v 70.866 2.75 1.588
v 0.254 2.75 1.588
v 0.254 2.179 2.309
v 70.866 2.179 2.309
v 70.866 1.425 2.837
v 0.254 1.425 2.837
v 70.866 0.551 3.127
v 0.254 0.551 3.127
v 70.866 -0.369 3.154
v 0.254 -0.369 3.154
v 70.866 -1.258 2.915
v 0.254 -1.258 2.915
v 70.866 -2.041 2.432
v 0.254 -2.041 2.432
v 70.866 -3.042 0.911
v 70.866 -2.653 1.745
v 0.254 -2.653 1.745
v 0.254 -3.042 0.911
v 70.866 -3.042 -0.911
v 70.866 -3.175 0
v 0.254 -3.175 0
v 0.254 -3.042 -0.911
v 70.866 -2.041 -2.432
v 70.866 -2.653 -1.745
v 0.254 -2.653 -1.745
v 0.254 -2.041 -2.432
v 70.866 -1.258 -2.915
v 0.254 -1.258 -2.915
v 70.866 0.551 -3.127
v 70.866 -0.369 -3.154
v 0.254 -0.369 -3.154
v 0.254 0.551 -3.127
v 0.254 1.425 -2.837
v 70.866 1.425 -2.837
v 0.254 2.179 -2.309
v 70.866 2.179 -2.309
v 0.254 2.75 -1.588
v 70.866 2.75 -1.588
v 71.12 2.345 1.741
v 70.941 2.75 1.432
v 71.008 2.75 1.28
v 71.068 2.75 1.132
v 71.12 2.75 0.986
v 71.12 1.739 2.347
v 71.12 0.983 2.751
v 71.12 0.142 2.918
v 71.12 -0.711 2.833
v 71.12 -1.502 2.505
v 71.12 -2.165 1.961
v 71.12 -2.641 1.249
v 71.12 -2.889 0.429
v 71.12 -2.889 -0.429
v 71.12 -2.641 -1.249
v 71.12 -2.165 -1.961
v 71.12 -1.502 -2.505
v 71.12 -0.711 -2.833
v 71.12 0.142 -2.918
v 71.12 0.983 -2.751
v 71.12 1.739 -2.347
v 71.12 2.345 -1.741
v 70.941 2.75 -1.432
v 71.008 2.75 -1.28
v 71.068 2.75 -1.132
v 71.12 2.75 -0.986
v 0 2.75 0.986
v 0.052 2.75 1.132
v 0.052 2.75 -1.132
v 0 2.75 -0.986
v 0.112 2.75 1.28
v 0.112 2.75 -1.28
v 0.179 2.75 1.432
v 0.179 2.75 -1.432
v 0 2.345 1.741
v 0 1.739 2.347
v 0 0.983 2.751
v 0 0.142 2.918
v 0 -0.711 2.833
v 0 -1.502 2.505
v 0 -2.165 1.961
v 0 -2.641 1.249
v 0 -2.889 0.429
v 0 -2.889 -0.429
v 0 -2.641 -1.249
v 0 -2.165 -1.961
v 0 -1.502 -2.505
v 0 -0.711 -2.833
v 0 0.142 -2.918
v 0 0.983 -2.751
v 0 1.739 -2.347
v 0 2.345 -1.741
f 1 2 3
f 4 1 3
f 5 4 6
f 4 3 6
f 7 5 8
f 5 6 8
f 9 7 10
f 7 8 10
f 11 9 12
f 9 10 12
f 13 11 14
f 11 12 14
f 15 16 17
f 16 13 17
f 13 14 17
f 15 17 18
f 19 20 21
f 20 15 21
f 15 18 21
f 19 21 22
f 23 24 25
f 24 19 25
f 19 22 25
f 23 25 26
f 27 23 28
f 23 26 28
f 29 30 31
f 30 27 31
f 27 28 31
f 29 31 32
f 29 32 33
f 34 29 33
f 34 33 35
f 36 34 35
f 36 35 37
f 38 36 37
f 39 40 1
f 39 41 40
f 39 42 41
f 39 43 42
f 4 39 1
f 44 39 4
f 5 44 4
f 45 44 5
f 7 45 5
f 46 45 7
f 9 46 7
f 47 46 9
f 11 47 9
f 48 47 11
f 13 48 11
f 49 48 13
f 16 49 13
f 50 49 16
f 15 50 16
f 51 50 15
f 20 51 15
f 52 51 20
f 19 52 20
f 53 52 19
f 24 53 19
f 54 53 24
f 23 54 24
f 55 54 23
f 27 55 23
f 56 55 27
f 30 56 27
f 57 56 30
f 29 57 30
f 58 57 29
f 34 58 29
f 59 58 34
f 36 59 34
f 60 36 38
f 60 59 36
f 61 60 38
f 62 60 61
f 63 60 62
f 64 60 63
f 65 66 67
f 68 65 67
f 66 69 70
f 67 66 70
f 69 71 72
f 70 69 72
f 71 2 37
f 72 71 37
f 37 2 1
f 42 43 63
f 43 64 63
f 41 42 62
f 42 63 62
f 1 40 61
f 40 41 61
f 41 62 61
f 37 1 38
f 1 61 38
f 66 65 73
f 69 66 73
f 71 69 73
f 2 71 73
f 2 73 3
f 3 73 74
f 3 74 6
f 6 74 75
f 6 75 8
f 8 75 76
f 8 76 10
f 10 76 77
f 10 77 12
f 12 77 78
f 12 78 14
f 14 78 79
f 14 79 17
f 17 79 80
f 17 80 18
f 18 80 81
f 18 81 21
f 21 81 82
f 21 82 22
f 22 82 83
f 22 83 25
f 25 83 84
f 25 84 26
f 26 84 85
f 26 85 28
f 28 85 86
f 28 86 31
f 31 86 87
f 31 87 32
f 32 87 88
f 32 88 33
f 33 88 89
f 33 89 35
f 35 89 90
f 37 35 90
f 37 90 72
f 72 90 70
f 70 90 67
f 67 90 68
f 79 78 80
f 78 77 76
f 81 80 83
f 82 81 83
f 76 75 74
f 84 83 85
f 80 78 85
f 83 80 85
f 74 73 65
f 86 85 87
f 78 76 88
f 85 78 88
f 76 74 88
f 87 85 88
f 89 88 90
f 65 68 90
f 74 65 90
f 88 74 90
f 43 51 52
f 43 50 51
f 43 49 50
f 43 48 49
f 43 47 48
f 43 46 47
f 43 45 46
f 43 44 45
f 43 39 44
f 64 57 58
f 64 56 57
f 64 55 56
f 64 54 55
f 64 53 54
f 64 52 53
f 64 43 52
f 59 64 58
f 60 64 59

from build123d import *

# Parameters (mm, degrees)
SKETCH1_R           = 3.175
BOSS_EXTRUDE1_DEPTH = 71.12
CHAMFER1_SIZE       = 0.254
CUT_EXTRUDE2_DEPTH  = 72.261600108


with BuildPart() as part:
    # Sketch1 → Boss-Extrude1 (new body)
    with BuildSketch(Plane(origin=(0, 0, 0), x_dir=(0, 0, -1), z_dir=(1, 0, 0))):
        Circle(SKETCH1_R)
    extrude(amount=BOSS_EXTRUDE1_DEPTH)

    # Chamfer1
    chamfer1_edges = [part.edges().sort_by_distance(p)[0] for p in [
        (0, 0, 3.175),
        (71.12, 0, 3.175),
    ]]
    chamfer(chamfer1_edges, length=CHAMFER1_SIZE)

    # Sketch2 → Cut-Extrude2 (cut, through all)
    with BuildSketch(Plane(origin=(71.12, 0, 0), x_dir=(0, 0, -1), z_dir=(1, 0, 0))):
        with BuildLine():
            Line((-1.5875, 2.749630657), (1.5875, 2.749630657))
            ThreePointArc((1.5875, 2.749630657), (0, 3.175), (-1.5875, 2.749630657))
        make_face()
    extrude(amount=-CUT_EXTRUDE2_DEPTH, mode=Mode.SUBTRACT)


solid = part.part
